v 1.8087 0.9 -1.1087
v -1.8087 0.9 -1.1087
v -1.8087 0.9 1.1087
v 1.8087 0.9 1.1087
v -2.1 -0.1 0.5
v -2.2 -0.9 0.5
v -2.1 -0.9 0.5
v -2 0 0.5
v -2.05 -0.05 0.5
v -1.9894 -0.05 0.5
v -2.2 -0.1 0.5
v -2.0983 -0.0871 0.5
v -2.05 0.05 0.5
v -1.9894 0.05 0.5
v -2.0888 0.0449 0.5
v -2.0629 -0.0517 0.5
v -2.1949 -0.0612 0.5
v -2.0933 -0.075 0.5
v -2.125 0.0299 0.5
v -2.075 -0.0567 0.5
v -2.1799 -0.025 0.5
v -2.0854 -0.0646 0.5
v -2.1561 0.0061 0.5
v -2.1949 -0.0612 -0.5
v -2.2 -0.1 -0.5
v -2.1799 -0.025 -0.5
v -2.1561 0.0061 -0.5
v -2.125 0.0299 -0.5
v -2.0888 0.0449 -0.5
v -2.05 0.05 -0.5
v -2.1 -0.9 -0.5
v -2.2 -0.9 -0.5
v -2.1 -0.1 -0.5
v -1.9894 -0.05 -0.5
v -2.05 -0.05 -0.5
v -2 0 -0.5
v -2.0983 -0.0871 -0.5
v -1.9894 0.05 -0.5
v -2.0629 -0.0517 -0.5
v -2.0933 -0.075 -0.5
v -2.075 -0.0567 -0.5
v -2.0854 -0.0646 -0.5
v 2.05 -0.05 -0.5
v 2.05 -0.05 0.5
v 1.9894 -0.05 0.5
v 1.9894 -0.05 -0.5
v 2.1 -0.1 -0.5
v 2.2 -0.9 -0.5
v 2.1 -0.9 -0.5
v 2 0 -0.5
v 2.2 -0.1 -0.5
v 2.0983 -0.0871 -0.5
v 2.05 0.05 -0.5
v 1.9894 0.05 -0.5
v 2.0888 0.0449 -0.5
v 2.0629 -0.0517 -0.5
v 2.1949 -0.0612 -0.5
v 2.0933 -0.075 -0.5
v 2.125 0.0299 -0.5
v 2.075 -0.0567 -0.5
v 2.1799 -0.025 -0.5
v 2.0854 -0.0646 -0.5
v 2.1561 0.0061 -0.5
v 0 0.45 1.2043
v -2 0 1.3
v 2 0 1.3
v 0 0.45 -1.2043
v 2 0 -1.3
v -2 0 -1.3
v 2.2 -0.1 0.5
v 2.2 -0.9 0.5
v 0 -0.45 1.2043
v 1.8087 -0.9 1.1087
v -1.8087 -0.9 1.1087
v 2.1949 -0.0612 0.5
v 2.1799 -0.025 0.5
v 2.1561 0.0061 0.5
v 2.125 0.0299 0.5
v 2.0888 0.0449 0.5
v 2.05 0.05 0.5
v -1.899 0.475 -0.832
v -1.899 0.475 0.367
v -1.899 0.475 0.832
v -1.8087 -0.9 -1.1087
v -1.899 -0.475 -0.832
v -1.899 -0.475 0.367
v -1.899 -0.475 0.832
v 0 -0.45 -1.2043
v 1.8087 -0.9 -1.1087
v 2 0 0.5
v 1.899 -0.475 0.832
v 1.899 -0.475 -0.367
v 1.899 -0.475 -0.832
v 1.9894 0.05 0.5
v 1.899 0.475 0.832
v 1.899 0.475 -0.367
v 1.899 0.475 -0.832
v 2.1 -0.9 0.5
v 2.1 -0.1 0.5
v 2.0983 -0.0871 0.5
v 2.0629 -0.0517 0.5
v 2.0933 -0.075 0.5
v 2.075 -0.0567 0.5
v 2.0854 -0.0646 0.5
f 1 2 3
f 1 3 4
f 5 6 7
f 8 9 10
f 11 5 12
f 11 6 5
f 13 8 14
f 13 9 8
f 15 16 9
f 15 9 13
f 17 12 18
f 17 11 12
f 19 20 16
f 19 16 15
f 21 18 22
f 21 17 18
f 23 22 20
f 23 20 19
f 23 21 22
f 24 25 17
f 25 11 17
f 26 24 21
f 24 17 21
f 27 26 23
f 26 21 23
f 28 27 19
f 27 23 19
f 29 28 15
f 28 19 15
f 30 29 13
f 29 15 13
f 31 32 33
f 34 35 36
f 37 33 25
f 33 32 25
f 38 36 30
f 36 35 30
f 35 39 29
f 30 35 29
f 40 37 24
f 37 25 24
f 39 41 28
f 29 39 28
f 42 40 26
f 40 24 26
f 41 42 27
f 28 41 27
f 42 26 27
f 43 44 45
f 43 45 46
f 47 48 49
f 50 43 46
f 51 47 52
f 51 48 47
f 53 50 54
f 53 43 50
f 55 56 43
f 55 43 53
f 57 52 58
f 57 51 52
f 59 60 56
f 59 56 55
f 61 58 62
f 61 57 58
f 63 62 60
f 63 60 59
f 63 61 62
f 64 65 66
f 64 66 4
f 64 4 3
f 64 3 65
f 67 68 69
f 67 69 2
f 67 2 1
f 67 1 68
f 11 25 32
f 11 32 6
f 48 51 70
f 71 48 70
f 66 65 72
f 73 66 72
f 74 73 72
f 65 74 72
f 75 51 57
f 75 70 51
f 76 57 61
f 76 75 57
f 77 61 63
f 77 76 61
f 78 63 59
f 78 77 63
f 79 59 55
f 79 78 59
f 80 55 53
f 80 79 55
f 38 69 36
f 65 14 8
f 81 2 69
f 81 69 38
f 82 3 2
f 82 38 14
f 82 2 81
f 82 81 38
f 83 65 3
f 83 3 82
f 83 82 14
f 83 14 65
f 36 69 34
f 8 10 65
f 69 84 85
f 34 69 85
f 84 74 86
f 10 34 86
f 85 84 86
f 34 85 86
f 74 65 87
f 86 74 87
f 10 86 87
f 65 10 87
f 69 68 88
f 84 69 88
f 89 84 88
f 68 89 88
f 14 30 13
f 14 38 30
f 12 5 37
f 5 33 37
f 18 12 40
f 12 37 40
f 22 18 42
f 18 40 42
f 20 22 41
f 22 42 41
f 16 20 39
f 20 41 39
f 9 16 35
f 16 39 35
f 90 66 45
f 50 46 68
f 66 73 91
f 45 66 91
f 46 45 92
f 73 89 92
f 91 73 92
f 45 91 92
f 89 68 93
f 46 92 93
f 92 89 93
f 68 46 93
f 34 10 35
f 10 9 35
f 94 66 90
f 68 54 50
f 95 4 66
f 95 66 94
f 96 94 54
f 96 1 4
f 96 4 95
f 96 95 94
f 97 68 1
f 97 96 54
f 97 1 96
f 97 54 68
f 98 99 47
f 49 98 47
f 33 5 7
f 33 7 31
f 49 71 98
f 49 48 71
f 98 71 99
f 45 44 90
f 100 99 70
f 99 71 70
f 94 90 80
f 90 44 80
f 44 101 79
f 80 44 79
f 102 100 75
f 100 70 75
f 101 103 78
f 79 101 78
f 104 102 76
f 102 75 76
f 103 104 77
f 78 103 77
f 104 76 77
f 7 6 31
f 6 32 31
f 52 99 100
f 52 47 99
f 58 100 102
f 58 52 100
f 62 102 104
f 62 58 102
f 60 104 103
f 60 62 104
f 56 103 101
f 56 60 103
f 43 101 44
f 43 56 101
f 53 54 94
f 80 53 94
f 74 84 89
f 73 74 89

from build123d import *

# Parameters (mm, degrees)
SKETCH1_W            = 4
SKETCH1_H            = 2.6
MB_DEPTH             = 0.9
MB_TAPER             = 12
MB_OTHER_WAY_DEPTH   = 0.9
MB_OTHER_WAY_TAPER   = 12
SKETCH3_W            = 1
SKETCH3_H            = 0.1
SKETCH4_W            = 1
SKETCH4_H            = 0.1
LEG_COMPLETION_DEPTH = 0.010628


with BuildPart() as part:
    # Sketch1 → MB (new body)
    with BuildSketch(Plane(origin=(0, 0, 0), x_dir=(1, 0, 0), z_dir=(0, 1, 0))):
        Rectangle(SKETCH1_W, SKETCH1_H)
    extrude(amount=MB_DEPTH, taper=MB_TAPER)

    # Sketch1 → MB other way (add)
    with BuildSketch(Plane(origin=(0, 0, 0), x_dir=(1, 0, 0), z_dir=(0, 1, 0))):
        Rectangle(SKETCH1_W, SKETCH1_H)
    extrude(amount=-MB_OTHER_WAY_DEPTH, taper=MB_OTHER_WAY_TAPER)



with BuildPart() as body_2:
    # LEG: sweep along a path in Sketch2
    with BuildLine(Plane.XY) as leg_path:
        Line((-2.15, -0.9), (-2.15, -0.1))
        ThreePointArc((-2.15, -0.1), (-2.120710678, -0.029289322), (-2.05, 0))
        Line((-2.05, 0), (-2, 0))
    # Sketch3 → LEG (sweep)
    with BuildSketch(Plane(origin=(-2, 0, 0), x_dir=(0, 0, -1), z_dir=(1, 0, 0))):
        Rectangle(SKETCH3_W, SKETCH3_H)
    leg = sweep(path=leg_path.line)


with BuildPart() as part_1:
    add(part.part)

    add(body_2.part)  # LEG COMPLETION merges body 2
    # Sketch4 → LEG COMPLETION (add)
    with BuildSketch(Plane(origin=(-2, 0, 0), x_dir=(0, 0, -1), z_dir=(1, 0, 0))):
        Rectangle(SKETCH4_W, SKETCH4_H)
    leg_completion = extrude(amount=LEG_COMPLETION_DEPTH)

    # Mirror2: LEG, LEG COMPLETION across plane
    add(leg.mirror(Plane(origin=(0, 0, 0), x_dir=(0, 0, 1), z_dir=(1, 0, 0))))
    add(leg_completion.mirror(Plane(origin=(0, 0, 0), x_dir=(0, 0, 1), z_dir=(1, 0, 0))))


solid = part_1.part
